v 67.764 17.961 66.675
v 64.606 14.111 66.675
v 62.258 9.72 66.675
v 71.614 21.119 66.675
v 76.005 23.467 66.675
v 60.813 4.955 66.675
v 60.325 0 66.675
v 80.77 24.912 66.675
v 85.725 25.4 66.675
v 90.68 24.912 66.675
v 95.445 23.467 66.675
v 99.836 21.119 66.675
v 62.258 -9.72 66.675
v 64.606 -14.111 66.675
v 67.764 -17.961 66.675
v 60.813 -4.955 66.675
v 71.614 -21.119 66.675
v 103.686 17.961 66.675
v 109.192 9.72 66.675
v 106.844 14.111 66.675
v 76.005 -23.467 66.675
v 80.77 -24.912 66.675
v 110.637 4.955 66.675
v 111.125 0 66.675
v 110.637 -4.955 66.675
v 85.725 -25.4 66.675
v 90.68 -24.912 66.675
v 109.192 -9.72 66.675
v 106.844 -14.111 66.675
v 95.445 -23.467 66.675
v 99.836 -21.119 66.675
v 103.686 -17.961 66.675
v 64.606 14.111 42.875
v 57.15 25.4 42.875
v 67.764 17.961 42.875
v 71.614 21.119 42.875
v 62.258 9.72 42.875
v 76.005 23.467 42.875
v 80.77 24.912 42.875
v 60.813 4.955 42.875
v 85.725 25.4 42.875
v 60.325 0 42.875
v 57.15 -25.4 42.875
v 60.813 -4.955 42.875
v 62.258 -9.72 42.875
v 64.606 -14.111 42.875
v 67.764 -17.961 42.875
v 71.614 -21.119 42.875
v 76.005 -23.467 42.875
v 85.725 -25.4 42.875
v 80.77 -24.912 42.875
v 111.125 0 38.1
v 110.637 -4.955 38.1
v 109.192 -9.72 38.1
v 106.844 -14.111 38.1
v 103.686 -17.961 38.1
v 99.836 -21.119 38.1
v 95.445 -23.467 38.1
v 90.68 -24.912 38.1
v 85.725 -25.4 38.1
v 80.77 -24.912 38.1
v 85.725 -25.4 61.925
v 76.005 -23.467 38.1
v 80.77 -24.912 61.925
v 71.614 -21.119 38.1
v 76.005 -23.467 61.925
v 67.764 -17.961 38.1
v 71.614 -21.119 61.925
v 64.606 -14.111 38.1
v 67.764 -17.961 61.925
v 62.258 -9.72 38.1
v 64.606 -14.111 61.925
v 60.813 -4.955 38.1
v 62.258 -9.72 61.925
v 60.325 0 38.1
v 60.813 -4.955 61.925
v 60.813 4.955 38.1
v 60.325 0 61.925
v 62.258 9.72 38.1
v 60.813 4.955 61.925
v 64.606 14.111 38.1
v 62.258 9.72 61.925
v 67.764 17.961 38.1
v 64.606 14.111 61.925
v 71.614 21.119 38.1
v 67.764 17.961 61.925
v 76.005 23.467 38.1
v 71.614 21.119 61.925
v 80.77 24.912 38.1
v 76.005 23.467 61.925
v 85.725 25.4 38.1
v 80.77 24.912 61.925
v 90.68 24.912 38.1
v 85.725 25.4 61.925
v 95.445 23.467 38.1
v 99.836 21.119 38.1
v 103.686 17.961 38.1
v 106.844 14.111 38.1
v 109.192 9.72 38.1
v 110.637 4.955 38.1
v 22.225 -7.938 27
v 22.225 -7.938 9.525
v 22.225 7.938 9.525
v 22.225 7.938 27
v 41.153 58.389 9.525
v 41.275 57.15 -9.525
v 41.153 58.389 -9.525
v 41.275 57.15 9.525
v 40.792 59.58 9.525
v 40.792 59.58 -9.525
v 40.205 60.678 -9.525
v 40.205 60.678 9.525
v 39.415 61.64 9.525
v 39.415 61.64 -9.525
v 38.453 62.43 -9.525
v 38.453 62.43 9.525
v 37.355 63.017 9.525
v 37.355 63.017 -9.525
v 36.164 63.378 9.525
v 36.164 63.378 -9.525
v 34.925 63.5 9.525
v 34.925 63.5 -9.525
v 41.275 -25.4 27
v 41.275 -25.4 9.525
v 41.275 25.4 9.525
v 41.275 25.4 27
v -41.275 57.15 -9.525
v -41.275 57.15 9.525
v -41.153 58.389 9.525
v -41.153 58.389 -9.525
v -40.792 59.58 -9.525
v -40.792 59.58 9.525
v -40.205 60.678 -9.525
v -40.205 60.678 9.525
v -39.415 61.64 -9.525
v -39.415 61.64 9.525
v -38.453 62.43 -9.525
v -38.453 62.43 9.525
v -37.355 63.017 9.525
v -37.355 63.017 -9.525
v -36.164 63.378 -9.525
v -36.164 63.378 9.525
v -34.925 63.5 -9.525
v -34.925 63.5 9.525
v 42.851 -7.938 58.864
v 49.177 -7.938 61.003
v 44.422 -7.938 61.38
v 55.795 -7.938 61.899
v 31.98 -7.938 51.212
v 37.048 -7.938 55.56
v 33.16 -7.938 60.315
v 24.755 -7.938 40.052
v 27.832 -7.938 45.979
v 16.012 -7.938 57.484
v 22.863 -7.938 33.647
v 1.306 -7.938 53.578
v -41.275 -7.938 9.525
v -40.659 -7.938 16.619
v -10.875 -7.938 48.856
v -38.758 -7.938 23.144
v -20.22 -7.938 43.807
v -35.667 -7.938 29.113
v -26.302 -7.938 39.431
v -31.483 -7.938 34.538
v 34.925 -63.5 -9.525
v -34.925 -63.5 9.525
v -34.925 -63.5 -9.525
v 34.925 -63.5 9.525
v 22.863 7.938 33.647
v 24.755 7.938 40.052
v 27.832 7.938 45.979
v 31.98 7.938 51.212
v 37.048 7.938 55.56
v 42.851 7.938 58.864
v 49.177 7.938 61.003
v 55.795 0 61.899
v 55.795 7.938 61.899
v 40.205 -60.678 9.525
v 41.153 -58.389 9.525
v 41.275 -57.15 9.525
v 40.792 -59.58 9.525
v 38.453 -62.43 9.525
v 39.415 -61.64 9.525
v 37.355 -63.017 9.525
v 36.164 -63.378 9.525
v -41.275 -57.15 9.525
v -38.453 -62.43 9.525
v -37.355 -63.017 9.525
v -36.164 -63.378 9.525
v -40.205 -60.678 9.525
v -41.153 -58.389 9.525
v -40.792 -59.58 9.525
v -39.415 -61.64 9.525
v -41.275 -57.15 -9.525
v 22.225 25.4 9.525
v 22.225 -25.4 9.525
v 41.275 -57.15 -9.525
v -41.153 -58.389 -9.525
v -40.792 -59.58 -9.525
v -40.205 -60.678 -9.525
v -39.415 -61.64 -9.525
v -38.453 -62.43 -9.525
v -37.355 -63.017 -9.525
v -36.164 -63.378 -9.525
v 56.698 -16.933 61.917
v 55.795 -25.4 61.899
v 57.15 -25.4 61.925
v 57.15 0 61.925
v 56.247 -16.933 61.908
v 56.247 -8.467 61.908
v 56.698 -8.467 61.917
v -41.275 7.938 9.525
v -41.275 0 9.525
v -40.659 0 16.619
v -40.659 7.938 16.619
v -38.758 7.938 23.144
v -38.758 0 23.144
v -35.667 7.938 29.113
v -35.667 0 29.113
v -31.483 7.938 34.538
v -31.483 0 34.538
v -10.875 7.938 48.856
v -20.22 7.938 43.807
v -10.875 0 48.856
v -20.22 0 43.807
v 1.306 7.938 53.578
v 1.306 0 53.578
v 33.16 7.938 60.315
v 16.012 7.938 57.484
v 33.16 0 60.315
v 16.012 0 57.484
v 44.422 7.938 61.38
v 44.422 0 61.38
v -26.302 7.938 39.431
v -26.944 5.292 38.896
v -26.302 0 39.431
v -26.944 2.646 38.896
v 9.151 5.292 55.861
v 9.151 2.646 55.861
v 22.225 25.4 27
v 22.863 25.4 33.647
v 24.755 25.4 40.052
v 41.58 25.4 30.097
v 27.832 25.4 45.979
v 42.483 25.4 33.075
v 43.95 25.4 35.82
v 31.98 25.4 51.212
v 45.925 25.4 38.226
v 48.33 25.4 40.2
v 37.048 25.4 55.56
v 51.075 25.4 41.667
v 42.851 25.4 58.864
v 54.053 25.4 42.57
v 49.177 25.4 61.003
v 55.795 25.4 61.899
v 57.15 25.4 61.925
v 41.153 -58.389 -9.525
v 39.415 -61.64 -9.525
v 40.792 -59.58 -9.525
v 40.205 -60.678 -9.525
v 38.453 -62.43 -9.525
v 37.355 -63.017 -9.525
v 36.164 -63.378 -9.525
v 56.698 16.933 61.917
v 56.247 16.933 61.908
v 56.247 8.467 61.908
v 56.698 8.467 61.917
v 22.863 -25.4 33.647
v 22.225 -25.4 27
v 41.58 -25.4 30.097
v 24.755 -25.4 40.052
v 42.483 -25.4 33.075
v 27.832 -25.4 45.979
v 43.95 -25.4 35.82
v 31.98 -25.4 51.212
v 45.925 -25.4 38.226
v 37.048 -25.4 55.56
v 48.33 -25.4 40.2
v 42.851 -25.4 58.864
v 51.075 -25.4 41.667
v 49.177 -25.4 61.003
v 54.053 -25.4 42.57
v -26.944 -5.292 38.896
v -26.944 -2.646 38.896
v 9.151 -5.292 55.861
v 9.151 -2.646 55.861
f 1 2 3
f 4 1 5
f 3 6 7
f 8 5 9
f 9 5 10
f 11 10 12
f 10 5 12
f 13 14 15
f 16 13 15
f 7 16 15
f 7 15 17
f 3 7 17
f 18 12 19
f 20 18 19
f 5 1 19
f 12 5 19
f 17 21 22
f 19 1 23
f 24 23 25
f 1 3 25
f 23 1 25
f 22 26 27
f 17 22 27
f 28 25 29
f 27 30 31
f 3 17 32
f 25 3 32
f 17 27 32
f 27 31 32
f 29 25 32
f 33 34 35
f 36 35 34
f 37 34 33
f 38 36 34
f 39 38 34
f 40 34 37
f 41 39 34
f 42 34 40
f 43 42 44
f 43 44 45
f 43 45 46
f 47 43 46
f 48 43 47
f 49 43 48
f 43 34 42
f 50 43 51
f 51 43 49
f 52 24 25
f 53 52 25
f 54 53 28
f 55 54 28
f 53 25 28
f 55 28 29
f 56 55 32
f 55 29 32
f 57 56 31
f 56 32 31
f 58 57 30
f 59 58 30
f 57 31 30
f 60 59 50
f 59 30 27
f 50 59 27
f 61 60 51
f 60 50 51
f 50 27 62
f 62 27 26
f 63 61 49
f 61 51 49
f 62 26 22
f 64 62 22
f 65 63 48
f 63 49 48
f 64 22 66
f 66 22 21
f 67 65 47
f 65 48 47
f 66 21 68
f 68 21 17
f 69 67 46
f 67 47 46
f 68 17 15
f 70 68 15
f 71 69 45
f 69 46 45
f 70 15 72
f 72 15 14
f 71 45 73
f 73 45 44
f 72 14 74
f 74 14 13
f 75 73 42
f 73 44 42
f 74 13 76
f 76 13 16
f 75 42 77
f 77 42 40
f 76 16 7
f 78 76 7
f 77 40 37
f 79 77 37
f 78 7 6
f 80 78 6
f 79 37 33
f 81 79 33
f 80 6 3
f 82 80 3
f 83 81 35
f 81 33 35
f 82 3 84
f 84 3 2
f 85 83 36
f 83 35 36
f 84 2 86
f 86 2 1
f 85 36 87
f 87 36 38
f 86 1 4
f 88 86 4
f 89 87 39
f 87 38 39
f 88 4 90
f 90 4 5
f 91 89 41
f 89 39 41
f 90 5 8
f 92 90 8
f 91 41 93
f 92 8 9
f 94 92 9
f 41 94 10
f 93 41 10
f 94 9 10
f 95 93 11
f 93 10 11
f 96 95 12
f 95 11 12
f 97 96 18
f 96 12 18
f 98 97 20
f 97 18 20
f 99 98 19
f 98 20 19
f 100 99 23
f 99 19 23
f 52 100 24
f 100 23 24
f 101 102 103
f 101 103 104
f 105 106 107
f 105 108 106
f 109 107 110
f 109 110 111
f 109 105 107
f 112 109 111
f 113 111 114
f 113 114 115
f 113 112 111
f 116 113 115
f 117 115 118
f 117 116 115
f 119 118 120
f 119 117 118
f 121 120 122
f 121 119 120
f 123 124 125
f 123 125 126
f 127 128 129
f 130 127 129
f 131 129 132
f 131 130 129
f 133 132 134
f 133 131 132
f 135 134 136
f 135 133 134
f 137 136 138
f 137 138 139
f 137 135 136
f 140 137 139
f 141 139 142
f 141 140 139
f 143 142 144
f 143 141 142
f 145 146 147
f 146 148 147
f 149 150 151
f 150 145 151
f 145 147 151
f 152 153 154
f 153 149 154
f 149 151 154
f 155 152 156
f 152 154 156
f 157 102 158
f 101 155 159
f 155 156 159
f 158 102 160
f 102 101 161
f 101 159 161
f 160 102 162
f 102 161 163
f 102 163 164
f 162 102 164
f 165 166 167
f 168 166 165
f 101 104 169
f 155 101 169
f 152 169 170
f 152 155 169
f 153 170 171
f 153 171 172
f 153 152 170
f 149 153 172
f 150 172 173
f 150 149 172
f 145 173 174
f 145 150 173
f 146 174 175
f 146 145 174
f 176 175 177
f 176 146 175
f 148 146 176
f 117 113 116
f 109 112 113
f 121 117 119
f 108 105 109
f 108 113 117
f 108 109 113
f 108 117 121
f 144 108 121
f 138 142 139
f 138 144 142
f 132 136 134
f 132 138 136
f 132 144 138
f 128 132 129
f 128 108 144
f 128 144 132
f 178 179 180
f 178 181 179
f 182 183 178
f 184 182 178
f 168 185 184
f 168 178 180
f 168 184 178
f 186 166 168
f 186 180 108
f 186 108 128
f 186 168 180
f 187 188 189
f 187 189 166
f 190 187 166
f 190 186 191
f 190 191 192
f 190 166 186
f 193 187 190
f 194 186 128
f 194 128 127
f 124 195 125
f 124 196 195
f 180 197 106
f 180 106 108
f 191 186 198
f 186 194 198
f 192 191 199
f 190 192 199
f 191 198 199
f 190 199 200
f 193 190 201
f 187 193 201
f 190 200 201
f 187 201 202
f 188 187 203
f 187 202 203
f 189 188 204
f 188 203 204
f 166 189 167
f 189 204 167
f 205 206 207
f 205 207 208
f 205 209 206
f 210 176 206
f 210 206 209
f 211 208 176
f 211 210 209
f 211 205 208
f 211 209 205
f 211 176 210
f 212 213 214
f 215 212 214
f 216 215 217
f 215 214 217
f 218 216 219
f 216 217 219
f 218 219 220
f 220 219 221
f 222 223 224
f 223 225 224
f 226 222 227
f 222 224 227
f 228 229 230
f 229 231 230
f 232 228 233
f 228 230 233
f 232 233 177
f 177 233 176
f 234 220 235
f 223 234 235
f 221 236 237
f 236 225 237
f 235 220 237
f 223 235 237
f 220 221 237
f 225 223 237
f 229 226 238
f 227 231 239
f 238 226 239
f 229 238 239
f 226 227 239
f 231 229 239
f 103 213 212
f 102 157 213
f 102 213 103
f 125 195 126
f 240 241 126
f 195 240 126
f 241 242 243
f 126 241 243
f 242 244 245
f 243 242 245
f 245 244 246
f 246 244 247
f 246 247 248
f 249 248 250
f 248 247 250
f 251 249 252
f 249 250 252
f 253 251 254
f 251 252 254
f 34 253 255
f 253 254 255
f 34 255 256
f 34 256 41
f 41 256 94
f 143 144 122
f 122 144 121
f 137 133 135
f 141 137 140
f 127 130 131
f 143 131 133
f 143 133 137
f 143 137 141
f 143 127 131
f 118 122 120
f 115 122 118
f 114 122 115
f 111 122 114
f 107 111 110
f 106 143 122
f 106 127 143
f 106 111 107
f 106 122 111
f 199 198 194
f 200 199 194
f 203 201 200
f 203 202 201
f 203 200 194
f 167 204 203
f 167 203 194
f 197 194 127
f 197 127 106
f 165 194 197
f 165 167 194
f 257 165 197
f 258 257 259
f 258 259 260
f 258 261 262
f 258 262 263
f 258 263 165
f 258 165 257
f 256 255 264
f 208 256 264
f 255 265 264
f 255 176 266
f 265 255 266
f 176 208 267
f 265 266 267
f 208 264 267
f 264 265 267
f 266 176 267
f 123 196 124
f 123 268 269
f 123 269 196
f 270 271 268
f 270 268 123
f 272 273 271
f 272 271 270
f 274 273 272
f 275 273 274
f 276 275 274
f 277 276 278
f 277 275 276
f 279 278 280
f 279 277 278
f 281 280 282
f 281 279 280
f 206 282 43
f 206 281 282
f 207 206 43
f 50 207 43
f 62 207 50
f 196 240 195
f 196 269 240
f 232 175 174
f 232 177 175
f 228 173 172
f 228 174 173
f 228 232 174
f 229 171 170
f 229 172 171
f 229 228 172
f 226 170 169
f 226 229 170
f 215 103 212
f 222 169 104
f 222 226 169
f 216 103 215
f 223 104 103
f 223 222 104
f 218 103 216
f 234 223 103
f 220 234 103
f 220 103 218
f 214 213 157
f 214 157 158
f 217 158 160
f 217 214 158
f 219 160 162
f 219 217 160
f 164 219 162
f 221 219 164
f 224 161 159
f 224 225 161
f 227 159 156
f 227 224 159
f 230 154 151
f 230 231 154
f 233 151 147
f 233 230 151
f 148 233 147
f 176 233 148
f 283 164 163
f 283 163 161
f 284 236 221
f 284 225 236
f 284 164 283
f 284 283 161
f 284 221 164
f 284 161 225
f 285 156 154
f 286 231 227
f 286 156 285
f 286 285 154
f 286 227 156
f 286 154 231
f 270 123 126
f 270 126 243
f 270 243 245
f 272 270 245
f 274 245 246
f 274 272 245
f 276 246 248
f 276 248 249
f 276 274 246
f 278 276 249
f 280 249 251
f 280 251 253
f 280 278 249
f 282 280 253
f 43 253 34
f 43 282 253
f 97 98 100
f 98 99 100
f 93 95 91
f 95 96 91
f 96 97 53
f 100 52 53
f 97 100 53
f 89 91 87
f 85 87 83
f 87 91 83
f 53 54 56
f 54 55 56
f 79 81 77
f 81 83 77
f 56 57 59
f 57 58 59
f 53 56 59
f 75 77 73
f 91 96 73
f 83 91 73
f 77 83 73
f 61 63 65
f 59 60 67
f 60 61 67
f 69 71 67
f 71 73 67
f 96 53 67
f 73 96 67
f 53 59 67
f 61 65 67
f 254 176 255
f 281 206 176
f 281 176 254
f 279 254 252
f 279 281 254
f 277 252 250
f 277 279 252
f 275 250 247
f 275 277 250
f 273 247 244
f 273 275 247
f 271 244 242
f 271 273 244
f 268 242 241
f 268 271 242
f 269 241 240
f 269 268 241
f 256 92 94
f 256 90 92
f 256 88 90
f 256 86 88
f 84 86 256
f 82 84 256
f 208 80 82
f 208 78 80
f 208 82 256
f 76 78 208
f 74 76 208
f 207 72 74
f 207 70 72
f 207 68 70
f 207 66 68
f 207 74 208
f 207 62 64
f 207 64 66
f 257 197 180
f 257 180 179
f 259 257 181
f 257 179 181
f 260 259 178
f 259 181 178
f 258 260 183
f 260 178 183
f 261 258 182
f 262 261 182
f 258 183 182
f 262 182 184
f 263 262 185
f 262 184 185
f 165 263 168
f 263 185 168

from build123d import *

# Parameters (mm, degrees)
F1_DEPTH = 63.5
F0_W     = 25.4
F0_H     = 19.05
F2_DEPTH = 25.4
F3_DEPTH = 7.9375
F5_R     = 6.35


with BuildPart() as f1:
    # F0 (on Front) → F1 (new body, symmetric)
    with BuildSketch(Plane.XZ):
        Polygon((-41.275, 9.525), (-41.275, -9.525), (41.275, -9.525), (41.275, 9.525), (22.225, 9.525), align=None)
    extrude(amount=F1_DEPTH, both=True)

    # F5
    f5_edges = [f1.edges().sort_by_distance(p)[0] for p in [
        (-41.275, -63.5, 0),
        (41.275, -63.5, 0),
        (-41.275, 63.5, 0),
        (41.275, 63.5, 0),
    ]]
    fillet(f5_edges, radius=F5_R)


with BuildPart() as f2:
    # F0 (on Front) → F2 (new body, symmetric)
    with BuildSketch(Plane.XZ):
        with BuildLine():
            Line((22.225, 9.525), (41.275, 9.525))
            Line((41.275, 9.525), (41.275, 27.0002))
            ThreePointArc((41.275, 27.0002), (45.9246798487, 38.2255201513), (57.15, 42.8752))
            Line((57.15, 42.8752), (60.325, 42.8752))
            Line((60.325, 42.8752), (60.325, 61.9252))
            Line((60.325, 61.9252), (57.15, 61.9252))
            add(Edge.make_bspline(
                [(55.7946757302, 61.8988922552), (56.2465520458, 61.9089061366), (56.6983406792, 61.9176735536), (57.15, 61.9252)],
                knots=[110.4684727353, 110.4684727353, 110.4684727353, 110.4684727353, 111.5045361635, 111.5045361635, 111.5045361635, 111.5045361635], degree=3))
            ThreePointArc((55.7946757302, 61.8988922552), (31.9796769476, 51.2119835452), (22.225, 27.0002))
            Line((22.225, 27.0002), (22.225, 9.525))
        make_face()
        with Locations((73.025, 52.4002)):
            Rectangle(F0_W, F0_H)
    extrude(amount=F2_DEPTH, both=True)

    # F0 (on Front) → F4 (revolve)
    with BuildSketch(Plane.XZ):
        Polygon((85.725, 66.675), (85.725, 61.9252), (85.725, 42.8752), (85.725, 38.1), (111.125, 38.1), (111.125, 66.675), align=None)
    revolve(axis=Axis((85.725, 0, 52.3875), (0, 0, -1)))


with BuildPart() as f3:
    # F0 (on Front) → F3 (new body, symmetric)
    with BuildSketch(Plane.XZ):
        with BuildLine():
            add(Edge.make_bspline(
                [(-41.275, 9.525), (-41.5632032513, 45.593008189), (7.6141444166, 60.831179454), (55.7946757302, 61.8988922552)],
                knots=[0, 0, 0, 0, 110.4684727353, 110.4684727353, 110.4684727353, 110.4684727353], degree=3))
            Line((-41.275, 9.525), (22.225, 9.525))
            Line((22.225, 9.525), (22.225, 27.0002))
            ThreePointArc((22.225, 27.0002), (31.9796769476, 51.2119835452), (55.7946757302, 61.8988922552))
        make_face()
    extrude(amount=F3_DEPTH, both=True)


solid = Compound([f1.part, f2.part, f3.part])
